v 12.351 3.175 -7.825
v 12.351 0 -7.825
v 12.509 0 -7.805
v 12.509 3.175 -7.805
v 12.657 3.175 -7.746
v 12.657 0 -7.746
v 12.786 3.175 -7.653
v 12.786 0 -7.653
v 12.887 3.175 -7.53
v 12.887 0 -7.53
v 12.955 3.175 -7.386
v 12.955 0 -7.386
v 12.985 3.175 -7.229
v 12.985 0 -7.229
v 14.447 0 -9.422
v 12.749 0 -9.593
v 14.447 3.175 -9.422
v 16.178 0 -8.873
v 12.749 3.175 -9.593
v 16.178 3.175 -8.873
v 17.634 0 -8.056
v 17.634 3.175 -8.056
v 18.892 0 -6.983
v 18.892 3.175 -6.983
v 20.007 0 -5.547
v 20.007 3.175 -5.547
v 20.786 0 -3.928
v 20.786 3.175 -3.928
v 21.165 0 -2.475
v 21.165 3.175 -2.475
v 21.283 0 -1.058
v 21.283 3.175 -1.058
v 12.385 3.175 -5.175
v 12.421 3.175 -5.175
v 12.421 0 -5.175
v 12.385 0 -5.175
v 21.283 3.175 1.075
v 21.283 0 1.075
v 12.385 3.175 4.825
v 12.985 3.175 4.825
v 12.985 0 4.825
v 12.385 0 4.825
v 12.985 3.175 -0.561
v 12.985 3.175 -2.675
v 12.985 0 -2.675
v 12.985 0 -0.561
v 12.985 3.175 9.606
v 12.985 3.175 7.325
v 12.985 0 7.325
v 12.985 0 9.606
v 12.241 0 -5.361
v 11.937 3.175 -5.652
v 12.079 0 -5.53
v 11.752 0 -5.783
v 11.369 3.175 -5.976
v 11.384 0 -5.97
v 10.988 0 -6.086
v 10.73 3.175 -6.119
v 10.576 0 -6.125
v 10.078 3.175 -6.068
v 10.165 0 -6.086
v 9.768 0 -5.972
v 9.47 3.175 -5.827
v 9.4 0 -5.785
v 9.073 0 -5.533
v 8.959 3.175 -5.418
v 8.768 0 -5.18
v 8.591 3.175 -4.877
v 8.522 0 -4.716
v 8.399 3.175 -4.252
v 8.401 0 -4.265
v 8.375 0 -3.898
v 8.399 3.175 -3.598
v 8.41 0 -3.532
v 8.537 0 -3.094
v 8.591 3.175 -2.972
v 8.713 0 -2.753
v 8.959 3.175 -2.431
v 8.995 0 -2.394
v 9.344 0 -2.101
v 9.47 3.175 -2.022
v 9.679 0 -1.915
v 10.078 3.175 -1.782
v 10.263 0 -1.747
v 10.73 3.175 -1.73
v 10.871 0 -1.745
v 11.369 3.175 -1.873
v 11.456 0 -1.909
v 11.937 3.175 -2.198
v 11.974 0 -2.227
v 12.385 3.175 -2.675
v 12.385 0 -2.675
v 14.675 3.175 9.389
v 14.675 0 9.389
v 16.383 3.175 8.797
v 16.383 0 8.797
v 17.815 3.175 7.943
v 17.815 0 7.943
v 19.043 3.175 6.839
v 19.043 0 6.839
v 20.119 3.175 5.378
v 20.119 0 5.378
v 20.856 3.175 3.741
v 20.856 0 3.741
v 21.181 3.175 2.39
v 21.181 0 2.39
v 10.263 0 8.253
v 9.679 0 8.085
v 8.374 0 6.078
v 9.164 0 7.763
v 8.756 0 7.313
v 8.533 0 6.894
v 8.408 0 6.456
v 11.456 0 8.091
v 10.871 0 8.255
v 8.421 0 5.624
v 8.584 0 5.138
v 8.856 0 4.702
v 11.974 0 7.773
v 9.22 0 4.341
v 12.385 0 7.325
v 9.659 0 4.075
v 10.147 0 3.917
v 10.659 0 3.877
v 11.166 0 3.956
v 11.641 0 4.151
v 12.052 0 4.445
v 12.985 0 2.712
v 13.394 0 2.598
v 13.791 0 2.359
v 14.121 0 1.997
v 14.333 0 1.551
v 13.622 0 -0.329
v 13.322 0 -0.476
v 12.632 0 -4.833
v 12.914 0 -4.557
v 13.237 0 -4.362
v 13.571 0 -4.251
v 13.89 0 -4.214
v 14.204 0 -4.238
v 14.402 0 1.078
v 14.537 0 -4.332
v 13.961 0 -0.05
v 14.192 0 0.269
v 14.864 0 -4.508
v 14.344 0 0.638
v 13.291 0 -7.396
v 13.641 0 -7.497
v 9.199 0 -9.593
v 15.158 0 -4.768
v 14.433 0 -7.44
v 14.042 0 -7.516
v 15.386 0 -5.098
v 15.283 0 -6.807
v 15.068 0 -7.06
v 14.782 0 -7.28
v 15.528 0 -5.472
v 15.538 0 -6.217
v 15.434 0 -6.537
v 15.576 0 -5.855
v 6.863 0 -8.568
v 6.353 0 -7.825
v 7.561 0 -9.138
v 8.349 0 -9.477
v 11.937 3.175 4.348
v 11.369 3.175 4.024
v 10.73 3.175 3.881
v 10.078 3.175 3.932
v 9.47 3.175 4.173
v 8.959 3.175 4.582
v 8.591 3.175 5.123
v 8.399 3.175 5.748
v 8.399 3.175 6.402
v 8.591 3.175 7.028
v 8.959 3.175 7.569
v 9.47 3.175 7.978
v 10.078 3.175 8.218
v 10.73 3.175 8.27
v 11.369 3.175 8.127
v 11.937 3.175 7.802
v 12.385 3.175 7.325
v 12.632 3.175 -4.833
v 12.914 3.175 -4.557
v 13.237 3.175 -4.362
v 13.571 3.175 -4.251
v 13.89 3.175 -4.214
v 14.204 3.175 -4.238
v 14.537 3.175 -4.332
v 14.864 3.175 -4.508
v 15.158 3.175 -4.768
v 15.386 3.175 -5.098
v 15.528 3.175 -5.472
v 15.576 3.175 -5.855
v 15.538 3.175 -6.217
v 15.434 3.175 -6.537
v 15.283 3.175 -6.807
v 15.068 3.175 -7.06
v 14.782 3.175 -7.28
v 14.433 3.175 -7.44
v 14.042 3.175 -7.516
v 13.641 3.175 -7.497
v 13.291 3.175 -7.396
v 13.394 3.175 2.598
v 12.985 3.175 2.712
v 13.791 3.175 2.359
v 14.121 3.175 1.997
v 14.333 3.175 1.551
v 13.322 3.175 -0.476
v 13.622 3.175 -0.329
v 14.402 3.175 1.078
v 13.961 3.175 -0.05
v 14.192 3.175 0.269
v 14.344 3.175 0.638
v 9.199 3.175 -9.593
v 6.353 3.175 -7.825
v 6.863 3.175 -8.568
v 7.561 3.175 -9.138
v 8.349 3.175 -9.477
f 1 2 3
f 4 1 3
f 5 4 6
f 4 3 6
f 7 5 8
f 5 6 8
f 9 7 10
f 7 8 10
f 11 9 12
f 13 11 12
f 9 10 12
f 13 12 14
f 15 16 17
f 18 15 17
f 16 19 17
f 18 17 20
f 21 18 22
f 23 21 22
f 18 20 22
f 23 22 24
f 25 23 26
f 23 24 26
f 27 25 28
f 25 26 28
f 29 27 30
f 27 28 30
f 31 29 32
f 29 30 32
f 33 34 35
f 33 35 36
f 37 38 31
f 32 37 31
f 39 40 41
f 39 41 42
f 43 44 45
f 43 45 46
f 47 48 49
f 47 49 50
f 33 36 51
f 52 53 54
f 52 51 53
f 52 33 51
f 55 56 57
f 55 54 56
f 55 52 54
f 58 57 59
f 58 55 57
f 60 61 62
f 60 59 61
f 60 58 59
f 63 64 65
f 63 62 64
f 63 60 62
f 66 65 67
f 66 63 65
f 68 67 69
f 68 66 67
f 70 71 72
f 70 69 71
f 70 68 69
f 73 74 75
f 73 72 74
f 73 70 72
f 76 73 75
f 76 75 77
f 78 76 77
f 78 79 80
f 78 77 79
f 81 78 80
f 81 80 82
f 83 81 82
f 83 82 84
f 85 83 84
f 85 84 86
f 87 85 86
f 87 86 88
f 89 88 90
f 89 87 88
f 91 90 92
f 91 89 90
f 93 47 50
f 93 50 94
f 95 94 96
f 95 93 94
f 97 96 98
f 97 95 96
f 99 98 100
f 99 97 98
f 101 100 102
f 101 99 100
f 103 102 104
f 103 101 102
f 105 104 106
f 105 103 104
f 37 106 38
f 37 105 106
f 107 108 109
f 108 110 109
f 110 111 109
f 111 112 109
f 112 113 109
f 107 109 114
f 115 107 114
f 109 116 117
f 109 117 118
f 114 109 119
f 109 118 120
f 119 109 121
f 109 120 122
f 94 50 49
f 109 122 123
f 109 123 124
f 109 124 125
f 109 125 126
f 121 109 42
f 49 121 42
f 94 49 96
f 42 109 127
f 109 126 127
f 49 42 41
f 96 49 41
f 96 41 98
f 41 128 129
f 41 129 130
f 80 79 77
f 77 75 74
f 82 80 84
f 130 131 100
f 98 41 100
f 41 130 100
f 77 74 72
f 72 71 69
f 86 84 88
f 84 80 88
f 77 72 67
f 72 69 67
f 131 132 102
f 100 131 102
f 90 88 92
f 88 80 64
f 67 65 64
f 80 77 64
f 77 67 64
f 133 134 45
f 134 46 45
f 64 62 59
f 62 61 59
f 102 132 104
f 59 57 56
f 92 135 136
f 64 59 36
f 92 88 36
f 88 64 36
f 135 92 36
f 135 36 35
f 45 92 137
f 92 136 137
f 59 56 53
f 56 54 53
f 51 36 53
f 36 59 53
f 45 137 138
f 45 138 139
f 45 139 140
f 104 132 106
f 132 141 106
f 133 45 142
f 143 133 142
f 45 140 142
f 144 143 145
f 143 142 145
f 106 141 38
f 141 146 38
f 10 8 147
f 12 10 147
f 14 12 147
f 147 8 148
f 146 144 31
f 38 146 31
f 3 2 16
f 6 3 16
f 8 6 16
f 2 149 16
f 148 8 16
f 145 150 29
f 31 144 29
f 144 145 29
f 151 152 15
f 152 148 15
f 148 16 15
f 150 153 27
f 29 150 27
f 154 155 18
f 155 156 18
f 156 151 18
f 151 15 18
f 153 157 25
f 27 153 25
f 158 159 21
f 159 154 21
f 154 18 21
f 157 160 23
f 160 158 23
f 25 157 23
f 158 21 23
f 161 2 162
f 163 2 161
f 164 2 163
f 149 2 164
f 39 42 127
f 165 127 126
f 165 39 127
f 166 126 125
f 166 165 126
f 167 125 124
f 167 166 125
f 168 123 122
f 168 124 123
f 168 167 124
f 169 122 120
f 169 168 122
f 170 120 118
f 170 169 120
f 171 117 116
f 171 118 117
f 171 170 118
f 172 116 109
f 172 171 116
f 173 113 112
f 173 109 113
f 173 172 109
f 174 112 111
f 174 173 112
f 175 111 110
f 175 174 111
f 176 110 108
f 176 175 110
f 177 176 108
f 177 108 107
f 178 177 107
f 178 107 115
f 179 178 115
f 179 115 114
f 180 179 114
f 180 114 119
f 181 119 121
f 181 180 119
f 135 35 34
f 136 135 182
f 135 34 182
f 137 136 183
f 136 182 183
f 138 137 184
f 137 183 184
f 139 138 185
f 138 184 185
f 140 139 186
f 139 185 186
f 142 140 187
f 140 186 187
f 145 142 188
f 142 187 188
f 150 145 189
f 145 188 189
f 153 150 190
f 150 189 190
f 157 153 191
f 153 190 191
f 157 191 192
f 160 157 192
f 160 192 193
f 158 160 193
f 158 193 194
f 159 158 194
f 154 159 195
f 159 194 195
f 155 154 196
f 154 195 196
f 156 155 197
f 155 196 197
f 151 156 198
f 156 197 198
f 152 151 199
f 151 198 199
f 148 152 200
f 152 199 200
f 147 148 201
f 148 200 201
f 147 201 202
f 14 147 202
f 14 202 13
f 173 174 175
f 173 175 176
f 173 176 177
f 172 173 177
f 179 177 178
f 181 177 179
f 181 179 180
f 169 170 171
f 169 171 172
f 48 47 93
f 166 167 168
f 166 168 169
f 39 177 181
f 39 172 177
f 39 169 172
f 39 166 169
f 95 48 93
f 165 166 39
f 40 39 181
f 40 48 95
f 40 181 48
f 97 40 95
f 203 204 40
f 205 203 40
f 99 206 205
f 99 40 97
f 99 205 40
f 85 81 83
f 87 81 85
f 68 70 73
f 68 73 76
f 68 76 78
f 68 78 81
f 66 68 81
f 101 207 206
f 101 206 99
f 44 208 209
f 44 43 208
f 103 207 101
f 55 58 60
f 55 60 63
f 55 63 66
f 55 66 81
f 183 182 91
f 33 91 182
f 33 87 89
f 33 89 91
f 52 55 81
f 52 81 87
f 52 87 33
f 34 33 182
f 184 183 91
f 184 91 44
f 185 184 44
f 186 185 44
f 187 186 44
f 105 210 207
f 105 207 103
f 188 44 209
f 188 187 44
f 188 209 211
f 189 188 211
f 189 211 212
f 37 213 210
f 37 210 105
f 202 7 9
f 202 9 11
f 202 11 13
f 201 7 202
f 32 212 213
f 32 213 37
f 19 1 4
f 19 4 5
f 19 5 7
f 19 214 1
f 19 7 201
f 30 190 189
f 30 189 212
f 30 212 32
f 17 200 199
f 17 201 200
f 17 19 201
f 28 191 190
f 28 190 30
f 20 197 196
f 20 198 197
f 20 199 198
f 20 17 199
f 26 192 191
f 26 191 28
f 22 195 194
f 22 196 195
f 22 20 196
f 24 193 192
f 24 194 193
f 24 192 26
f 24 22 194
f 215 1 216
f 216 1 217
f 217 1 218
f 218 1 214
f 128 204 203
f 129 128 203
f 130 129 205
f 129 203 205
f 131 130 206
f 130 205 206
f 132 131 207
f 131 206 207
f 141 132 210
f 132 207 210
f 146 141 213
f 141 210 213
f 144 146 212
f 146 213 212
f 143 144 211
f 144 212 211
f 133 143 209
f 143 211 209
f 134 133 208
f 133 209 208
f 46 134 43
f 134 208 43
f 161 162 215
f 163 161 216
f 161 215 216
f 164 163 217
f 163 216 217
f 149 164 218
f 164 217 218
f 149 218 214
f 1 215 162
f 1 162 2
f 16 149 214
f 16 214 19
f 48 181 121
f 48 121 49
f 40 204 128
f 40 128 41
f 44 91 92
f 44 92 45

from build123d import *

# Parameters (mm, degrees)
SKETCH1_W           = 50.8
SKETCH1_H           = 22.86
BOSS_EXTRUDE1_DEPTH = 3.175
FILLET1_R           = 10.16
SKETCH3_R           = 1.9685
CUT_EXTRUDE1_DEPTH  = 29.033649869
FILLET3_R           = 10.16
SCALE1_SCALE_X      = 0.84
SCALE1_SCALE_Y      = 1
SCALE1_SCALE_Z      = 0.84
CUT_EXTRUDE2_DEPTH  = 24.662282921
FILLET4_R           = 3.175
FILLET5_DEPTH       = 3.175


with BuildPart() as part:
    # Sketch1 → Boss-Extrude1 (new body)
    with BuildSketch(Plane(origin=(0, 0, 0), x_dir=(1, 0, 0), z_dir=(0, 1, 0))):
        Rectangle(SKETCH1_W, SKETCH1_H)
    extrude(amount=BOSS_EXTRUDE1_DEPTH)

    # Fillet1
    fillet1_edges = [part.edges().sort_by_distance(p)[0] for p in [
        (25.4, 1.5875, 11.43),
        (-25.4, 1.5875, 11.43),
    ]]
    fillet(fillet1_edges, radius=FILLET1_R)

    # Sketch3 → Cut-Extrude1 (cut, through all)
    with BuildSketch(Plane(origin=(0, 3.175, 0), x_dir=(1, 0, 0), z_dir=(0, 1, 0))):
        with Locations(Location((15.24, -1.27, 0), (0, 0, 270))):
            Circle(SKETCH3_R)
        with Locations(Location((16.637, 6.994763457, 0), (0, 0, 270))):
            Circle(SKETCH3_R)
        with Locations(Location((-3.81, -1.27, 0), (0, 0, 270))):
            Circle(SKETCH3_R)
    extrude(amount=-CUT_EXTRUDE1_DEPTH, mode=Mode.SUBTRACT)

    # Fillet3
    fillet3_edges = [part.edges().sort_by_distance(p)[0] for p in [
        (-25.4, 1.5875, -11.43),
        (25.4, 1.5875, -11.43),
    ]]
    fillet(fillet3_edges, radius=FILLET3_R)


with BuildPart() as part_1:
    # Scale1: scaled about (-0.329754669, 1.5875, 0.052338299)
    add(part.part.scale((SCALE1_SCALE_X, SCALE1_SCALE_Y, SCALE1_SCALE_Z), about=(-0.329754669, 1.5875, 0.052338299)))

    # Sketch4 → Cut-Extrude2 (cut, through all)
    with BuildSketch(Plane(origin=(0, 3.175, 0), x_dir=(1, 0, 0), z_dir=(0, 1, 0))):
        with BuildLine():
            Line((12.984828754, -7.325177491), (12.984828754, -9.609574128))
            Line((12.984828754, -9.609574128), (-21.388760747, -9.609574128))
            Line((-21.388760747, -9.609574128), (-21.388760747, 9.592825872))
            Line((-21.388760747, 9.592825872), (6.353119253, 9.592825872))
            Line((6.353119253, 9.592825872), (6.353119253, 7.824824044))
            Line((6.353119253, 7.824824044), (12.984828754, 7.824824044))
            Line((12.984828754, 7.824824044), (12.984828754, 5.174822509))
            Line((12.984828754, 5.174822509), (12.384828754, 5.174822509))
            ThreePointArc((12.384828754, 5.174822509), (8.374442055, 3.924822509), (12.384828754, 2.674822509))
            Line((12.384828754, 2.674822509), (12.984828754, 2.674822509))
            Line((12.984828754, 2.674822509), (12.984828754, -4.825177491))
            Line((12.984828754, -4.825177491), (12.384828754, -4.825177491))
            ThreePointArc((12.384828754, -4.825177491), (8.374442055, -6.075177491), (12.384828754, -7.325177491))
            Line((12.384828754, -7.325177491), (12.984828754, -7.325177491))
        make_face()
    extrude(amount=-CUT_EXTRUDE2_DEPTH, mode=Mode.SUBTRACT)

    # Fillet4
    # the kernel refuses this fillet: 3.175 mm, written as the material it takes off along each edge
    with BuildSketch(Plane(origin=(6.353119253, 10.290555646, -9.592825872), x_dir=(1.0, 0, -2.4331567057805564e-11), z_dir=(0, -1, 0))) as fillet4_piece_1:
        with BuildLine():
            CenterArc((2.846222258, 3.175), FILLET4_R, 206.304974961, 63.695025041)
            Line((0, 1.768001828), (-0.056924445, 1.739861865))
            ThreePointArc((-0.056924445, 1.739861865), (-0.0635, 0.884000914), (-0.0635, 0))
            Line((-0.0635, 0), (0, -0.0635))
            Line((0, -0.0635), (2.846222258, -0.0635))
            Line((2.846222258, -0.0635), (2.846222258, 0))
        make_face()
    extrude(amount=17.406111292, mode=Mode.SUBTRACT)

    # Fillet5: read off the stored shape, not the designer's step
    # Fillet5 outline → Fillet5 (add)
    with BuildSketch(Plane(origin=(0, 0, 0), x_dir=(1, 0, 0), z_dir=(0, 1, 0))):
        with BuildLine():
            ThreePointArc((12.351058447, 7.824824044), (12.785881926, 7.65259131), (12.984828754, 7.22932339))
            Line((12.984828754, 7.22932339), (12.984828754, 7.824824044))
            Line((12.984828754, 7.824824044), (12.351058447, 7.824824044))
        make_face()
    extrude(amount=FILLET5_DEPTH)


solid = part_1.part
